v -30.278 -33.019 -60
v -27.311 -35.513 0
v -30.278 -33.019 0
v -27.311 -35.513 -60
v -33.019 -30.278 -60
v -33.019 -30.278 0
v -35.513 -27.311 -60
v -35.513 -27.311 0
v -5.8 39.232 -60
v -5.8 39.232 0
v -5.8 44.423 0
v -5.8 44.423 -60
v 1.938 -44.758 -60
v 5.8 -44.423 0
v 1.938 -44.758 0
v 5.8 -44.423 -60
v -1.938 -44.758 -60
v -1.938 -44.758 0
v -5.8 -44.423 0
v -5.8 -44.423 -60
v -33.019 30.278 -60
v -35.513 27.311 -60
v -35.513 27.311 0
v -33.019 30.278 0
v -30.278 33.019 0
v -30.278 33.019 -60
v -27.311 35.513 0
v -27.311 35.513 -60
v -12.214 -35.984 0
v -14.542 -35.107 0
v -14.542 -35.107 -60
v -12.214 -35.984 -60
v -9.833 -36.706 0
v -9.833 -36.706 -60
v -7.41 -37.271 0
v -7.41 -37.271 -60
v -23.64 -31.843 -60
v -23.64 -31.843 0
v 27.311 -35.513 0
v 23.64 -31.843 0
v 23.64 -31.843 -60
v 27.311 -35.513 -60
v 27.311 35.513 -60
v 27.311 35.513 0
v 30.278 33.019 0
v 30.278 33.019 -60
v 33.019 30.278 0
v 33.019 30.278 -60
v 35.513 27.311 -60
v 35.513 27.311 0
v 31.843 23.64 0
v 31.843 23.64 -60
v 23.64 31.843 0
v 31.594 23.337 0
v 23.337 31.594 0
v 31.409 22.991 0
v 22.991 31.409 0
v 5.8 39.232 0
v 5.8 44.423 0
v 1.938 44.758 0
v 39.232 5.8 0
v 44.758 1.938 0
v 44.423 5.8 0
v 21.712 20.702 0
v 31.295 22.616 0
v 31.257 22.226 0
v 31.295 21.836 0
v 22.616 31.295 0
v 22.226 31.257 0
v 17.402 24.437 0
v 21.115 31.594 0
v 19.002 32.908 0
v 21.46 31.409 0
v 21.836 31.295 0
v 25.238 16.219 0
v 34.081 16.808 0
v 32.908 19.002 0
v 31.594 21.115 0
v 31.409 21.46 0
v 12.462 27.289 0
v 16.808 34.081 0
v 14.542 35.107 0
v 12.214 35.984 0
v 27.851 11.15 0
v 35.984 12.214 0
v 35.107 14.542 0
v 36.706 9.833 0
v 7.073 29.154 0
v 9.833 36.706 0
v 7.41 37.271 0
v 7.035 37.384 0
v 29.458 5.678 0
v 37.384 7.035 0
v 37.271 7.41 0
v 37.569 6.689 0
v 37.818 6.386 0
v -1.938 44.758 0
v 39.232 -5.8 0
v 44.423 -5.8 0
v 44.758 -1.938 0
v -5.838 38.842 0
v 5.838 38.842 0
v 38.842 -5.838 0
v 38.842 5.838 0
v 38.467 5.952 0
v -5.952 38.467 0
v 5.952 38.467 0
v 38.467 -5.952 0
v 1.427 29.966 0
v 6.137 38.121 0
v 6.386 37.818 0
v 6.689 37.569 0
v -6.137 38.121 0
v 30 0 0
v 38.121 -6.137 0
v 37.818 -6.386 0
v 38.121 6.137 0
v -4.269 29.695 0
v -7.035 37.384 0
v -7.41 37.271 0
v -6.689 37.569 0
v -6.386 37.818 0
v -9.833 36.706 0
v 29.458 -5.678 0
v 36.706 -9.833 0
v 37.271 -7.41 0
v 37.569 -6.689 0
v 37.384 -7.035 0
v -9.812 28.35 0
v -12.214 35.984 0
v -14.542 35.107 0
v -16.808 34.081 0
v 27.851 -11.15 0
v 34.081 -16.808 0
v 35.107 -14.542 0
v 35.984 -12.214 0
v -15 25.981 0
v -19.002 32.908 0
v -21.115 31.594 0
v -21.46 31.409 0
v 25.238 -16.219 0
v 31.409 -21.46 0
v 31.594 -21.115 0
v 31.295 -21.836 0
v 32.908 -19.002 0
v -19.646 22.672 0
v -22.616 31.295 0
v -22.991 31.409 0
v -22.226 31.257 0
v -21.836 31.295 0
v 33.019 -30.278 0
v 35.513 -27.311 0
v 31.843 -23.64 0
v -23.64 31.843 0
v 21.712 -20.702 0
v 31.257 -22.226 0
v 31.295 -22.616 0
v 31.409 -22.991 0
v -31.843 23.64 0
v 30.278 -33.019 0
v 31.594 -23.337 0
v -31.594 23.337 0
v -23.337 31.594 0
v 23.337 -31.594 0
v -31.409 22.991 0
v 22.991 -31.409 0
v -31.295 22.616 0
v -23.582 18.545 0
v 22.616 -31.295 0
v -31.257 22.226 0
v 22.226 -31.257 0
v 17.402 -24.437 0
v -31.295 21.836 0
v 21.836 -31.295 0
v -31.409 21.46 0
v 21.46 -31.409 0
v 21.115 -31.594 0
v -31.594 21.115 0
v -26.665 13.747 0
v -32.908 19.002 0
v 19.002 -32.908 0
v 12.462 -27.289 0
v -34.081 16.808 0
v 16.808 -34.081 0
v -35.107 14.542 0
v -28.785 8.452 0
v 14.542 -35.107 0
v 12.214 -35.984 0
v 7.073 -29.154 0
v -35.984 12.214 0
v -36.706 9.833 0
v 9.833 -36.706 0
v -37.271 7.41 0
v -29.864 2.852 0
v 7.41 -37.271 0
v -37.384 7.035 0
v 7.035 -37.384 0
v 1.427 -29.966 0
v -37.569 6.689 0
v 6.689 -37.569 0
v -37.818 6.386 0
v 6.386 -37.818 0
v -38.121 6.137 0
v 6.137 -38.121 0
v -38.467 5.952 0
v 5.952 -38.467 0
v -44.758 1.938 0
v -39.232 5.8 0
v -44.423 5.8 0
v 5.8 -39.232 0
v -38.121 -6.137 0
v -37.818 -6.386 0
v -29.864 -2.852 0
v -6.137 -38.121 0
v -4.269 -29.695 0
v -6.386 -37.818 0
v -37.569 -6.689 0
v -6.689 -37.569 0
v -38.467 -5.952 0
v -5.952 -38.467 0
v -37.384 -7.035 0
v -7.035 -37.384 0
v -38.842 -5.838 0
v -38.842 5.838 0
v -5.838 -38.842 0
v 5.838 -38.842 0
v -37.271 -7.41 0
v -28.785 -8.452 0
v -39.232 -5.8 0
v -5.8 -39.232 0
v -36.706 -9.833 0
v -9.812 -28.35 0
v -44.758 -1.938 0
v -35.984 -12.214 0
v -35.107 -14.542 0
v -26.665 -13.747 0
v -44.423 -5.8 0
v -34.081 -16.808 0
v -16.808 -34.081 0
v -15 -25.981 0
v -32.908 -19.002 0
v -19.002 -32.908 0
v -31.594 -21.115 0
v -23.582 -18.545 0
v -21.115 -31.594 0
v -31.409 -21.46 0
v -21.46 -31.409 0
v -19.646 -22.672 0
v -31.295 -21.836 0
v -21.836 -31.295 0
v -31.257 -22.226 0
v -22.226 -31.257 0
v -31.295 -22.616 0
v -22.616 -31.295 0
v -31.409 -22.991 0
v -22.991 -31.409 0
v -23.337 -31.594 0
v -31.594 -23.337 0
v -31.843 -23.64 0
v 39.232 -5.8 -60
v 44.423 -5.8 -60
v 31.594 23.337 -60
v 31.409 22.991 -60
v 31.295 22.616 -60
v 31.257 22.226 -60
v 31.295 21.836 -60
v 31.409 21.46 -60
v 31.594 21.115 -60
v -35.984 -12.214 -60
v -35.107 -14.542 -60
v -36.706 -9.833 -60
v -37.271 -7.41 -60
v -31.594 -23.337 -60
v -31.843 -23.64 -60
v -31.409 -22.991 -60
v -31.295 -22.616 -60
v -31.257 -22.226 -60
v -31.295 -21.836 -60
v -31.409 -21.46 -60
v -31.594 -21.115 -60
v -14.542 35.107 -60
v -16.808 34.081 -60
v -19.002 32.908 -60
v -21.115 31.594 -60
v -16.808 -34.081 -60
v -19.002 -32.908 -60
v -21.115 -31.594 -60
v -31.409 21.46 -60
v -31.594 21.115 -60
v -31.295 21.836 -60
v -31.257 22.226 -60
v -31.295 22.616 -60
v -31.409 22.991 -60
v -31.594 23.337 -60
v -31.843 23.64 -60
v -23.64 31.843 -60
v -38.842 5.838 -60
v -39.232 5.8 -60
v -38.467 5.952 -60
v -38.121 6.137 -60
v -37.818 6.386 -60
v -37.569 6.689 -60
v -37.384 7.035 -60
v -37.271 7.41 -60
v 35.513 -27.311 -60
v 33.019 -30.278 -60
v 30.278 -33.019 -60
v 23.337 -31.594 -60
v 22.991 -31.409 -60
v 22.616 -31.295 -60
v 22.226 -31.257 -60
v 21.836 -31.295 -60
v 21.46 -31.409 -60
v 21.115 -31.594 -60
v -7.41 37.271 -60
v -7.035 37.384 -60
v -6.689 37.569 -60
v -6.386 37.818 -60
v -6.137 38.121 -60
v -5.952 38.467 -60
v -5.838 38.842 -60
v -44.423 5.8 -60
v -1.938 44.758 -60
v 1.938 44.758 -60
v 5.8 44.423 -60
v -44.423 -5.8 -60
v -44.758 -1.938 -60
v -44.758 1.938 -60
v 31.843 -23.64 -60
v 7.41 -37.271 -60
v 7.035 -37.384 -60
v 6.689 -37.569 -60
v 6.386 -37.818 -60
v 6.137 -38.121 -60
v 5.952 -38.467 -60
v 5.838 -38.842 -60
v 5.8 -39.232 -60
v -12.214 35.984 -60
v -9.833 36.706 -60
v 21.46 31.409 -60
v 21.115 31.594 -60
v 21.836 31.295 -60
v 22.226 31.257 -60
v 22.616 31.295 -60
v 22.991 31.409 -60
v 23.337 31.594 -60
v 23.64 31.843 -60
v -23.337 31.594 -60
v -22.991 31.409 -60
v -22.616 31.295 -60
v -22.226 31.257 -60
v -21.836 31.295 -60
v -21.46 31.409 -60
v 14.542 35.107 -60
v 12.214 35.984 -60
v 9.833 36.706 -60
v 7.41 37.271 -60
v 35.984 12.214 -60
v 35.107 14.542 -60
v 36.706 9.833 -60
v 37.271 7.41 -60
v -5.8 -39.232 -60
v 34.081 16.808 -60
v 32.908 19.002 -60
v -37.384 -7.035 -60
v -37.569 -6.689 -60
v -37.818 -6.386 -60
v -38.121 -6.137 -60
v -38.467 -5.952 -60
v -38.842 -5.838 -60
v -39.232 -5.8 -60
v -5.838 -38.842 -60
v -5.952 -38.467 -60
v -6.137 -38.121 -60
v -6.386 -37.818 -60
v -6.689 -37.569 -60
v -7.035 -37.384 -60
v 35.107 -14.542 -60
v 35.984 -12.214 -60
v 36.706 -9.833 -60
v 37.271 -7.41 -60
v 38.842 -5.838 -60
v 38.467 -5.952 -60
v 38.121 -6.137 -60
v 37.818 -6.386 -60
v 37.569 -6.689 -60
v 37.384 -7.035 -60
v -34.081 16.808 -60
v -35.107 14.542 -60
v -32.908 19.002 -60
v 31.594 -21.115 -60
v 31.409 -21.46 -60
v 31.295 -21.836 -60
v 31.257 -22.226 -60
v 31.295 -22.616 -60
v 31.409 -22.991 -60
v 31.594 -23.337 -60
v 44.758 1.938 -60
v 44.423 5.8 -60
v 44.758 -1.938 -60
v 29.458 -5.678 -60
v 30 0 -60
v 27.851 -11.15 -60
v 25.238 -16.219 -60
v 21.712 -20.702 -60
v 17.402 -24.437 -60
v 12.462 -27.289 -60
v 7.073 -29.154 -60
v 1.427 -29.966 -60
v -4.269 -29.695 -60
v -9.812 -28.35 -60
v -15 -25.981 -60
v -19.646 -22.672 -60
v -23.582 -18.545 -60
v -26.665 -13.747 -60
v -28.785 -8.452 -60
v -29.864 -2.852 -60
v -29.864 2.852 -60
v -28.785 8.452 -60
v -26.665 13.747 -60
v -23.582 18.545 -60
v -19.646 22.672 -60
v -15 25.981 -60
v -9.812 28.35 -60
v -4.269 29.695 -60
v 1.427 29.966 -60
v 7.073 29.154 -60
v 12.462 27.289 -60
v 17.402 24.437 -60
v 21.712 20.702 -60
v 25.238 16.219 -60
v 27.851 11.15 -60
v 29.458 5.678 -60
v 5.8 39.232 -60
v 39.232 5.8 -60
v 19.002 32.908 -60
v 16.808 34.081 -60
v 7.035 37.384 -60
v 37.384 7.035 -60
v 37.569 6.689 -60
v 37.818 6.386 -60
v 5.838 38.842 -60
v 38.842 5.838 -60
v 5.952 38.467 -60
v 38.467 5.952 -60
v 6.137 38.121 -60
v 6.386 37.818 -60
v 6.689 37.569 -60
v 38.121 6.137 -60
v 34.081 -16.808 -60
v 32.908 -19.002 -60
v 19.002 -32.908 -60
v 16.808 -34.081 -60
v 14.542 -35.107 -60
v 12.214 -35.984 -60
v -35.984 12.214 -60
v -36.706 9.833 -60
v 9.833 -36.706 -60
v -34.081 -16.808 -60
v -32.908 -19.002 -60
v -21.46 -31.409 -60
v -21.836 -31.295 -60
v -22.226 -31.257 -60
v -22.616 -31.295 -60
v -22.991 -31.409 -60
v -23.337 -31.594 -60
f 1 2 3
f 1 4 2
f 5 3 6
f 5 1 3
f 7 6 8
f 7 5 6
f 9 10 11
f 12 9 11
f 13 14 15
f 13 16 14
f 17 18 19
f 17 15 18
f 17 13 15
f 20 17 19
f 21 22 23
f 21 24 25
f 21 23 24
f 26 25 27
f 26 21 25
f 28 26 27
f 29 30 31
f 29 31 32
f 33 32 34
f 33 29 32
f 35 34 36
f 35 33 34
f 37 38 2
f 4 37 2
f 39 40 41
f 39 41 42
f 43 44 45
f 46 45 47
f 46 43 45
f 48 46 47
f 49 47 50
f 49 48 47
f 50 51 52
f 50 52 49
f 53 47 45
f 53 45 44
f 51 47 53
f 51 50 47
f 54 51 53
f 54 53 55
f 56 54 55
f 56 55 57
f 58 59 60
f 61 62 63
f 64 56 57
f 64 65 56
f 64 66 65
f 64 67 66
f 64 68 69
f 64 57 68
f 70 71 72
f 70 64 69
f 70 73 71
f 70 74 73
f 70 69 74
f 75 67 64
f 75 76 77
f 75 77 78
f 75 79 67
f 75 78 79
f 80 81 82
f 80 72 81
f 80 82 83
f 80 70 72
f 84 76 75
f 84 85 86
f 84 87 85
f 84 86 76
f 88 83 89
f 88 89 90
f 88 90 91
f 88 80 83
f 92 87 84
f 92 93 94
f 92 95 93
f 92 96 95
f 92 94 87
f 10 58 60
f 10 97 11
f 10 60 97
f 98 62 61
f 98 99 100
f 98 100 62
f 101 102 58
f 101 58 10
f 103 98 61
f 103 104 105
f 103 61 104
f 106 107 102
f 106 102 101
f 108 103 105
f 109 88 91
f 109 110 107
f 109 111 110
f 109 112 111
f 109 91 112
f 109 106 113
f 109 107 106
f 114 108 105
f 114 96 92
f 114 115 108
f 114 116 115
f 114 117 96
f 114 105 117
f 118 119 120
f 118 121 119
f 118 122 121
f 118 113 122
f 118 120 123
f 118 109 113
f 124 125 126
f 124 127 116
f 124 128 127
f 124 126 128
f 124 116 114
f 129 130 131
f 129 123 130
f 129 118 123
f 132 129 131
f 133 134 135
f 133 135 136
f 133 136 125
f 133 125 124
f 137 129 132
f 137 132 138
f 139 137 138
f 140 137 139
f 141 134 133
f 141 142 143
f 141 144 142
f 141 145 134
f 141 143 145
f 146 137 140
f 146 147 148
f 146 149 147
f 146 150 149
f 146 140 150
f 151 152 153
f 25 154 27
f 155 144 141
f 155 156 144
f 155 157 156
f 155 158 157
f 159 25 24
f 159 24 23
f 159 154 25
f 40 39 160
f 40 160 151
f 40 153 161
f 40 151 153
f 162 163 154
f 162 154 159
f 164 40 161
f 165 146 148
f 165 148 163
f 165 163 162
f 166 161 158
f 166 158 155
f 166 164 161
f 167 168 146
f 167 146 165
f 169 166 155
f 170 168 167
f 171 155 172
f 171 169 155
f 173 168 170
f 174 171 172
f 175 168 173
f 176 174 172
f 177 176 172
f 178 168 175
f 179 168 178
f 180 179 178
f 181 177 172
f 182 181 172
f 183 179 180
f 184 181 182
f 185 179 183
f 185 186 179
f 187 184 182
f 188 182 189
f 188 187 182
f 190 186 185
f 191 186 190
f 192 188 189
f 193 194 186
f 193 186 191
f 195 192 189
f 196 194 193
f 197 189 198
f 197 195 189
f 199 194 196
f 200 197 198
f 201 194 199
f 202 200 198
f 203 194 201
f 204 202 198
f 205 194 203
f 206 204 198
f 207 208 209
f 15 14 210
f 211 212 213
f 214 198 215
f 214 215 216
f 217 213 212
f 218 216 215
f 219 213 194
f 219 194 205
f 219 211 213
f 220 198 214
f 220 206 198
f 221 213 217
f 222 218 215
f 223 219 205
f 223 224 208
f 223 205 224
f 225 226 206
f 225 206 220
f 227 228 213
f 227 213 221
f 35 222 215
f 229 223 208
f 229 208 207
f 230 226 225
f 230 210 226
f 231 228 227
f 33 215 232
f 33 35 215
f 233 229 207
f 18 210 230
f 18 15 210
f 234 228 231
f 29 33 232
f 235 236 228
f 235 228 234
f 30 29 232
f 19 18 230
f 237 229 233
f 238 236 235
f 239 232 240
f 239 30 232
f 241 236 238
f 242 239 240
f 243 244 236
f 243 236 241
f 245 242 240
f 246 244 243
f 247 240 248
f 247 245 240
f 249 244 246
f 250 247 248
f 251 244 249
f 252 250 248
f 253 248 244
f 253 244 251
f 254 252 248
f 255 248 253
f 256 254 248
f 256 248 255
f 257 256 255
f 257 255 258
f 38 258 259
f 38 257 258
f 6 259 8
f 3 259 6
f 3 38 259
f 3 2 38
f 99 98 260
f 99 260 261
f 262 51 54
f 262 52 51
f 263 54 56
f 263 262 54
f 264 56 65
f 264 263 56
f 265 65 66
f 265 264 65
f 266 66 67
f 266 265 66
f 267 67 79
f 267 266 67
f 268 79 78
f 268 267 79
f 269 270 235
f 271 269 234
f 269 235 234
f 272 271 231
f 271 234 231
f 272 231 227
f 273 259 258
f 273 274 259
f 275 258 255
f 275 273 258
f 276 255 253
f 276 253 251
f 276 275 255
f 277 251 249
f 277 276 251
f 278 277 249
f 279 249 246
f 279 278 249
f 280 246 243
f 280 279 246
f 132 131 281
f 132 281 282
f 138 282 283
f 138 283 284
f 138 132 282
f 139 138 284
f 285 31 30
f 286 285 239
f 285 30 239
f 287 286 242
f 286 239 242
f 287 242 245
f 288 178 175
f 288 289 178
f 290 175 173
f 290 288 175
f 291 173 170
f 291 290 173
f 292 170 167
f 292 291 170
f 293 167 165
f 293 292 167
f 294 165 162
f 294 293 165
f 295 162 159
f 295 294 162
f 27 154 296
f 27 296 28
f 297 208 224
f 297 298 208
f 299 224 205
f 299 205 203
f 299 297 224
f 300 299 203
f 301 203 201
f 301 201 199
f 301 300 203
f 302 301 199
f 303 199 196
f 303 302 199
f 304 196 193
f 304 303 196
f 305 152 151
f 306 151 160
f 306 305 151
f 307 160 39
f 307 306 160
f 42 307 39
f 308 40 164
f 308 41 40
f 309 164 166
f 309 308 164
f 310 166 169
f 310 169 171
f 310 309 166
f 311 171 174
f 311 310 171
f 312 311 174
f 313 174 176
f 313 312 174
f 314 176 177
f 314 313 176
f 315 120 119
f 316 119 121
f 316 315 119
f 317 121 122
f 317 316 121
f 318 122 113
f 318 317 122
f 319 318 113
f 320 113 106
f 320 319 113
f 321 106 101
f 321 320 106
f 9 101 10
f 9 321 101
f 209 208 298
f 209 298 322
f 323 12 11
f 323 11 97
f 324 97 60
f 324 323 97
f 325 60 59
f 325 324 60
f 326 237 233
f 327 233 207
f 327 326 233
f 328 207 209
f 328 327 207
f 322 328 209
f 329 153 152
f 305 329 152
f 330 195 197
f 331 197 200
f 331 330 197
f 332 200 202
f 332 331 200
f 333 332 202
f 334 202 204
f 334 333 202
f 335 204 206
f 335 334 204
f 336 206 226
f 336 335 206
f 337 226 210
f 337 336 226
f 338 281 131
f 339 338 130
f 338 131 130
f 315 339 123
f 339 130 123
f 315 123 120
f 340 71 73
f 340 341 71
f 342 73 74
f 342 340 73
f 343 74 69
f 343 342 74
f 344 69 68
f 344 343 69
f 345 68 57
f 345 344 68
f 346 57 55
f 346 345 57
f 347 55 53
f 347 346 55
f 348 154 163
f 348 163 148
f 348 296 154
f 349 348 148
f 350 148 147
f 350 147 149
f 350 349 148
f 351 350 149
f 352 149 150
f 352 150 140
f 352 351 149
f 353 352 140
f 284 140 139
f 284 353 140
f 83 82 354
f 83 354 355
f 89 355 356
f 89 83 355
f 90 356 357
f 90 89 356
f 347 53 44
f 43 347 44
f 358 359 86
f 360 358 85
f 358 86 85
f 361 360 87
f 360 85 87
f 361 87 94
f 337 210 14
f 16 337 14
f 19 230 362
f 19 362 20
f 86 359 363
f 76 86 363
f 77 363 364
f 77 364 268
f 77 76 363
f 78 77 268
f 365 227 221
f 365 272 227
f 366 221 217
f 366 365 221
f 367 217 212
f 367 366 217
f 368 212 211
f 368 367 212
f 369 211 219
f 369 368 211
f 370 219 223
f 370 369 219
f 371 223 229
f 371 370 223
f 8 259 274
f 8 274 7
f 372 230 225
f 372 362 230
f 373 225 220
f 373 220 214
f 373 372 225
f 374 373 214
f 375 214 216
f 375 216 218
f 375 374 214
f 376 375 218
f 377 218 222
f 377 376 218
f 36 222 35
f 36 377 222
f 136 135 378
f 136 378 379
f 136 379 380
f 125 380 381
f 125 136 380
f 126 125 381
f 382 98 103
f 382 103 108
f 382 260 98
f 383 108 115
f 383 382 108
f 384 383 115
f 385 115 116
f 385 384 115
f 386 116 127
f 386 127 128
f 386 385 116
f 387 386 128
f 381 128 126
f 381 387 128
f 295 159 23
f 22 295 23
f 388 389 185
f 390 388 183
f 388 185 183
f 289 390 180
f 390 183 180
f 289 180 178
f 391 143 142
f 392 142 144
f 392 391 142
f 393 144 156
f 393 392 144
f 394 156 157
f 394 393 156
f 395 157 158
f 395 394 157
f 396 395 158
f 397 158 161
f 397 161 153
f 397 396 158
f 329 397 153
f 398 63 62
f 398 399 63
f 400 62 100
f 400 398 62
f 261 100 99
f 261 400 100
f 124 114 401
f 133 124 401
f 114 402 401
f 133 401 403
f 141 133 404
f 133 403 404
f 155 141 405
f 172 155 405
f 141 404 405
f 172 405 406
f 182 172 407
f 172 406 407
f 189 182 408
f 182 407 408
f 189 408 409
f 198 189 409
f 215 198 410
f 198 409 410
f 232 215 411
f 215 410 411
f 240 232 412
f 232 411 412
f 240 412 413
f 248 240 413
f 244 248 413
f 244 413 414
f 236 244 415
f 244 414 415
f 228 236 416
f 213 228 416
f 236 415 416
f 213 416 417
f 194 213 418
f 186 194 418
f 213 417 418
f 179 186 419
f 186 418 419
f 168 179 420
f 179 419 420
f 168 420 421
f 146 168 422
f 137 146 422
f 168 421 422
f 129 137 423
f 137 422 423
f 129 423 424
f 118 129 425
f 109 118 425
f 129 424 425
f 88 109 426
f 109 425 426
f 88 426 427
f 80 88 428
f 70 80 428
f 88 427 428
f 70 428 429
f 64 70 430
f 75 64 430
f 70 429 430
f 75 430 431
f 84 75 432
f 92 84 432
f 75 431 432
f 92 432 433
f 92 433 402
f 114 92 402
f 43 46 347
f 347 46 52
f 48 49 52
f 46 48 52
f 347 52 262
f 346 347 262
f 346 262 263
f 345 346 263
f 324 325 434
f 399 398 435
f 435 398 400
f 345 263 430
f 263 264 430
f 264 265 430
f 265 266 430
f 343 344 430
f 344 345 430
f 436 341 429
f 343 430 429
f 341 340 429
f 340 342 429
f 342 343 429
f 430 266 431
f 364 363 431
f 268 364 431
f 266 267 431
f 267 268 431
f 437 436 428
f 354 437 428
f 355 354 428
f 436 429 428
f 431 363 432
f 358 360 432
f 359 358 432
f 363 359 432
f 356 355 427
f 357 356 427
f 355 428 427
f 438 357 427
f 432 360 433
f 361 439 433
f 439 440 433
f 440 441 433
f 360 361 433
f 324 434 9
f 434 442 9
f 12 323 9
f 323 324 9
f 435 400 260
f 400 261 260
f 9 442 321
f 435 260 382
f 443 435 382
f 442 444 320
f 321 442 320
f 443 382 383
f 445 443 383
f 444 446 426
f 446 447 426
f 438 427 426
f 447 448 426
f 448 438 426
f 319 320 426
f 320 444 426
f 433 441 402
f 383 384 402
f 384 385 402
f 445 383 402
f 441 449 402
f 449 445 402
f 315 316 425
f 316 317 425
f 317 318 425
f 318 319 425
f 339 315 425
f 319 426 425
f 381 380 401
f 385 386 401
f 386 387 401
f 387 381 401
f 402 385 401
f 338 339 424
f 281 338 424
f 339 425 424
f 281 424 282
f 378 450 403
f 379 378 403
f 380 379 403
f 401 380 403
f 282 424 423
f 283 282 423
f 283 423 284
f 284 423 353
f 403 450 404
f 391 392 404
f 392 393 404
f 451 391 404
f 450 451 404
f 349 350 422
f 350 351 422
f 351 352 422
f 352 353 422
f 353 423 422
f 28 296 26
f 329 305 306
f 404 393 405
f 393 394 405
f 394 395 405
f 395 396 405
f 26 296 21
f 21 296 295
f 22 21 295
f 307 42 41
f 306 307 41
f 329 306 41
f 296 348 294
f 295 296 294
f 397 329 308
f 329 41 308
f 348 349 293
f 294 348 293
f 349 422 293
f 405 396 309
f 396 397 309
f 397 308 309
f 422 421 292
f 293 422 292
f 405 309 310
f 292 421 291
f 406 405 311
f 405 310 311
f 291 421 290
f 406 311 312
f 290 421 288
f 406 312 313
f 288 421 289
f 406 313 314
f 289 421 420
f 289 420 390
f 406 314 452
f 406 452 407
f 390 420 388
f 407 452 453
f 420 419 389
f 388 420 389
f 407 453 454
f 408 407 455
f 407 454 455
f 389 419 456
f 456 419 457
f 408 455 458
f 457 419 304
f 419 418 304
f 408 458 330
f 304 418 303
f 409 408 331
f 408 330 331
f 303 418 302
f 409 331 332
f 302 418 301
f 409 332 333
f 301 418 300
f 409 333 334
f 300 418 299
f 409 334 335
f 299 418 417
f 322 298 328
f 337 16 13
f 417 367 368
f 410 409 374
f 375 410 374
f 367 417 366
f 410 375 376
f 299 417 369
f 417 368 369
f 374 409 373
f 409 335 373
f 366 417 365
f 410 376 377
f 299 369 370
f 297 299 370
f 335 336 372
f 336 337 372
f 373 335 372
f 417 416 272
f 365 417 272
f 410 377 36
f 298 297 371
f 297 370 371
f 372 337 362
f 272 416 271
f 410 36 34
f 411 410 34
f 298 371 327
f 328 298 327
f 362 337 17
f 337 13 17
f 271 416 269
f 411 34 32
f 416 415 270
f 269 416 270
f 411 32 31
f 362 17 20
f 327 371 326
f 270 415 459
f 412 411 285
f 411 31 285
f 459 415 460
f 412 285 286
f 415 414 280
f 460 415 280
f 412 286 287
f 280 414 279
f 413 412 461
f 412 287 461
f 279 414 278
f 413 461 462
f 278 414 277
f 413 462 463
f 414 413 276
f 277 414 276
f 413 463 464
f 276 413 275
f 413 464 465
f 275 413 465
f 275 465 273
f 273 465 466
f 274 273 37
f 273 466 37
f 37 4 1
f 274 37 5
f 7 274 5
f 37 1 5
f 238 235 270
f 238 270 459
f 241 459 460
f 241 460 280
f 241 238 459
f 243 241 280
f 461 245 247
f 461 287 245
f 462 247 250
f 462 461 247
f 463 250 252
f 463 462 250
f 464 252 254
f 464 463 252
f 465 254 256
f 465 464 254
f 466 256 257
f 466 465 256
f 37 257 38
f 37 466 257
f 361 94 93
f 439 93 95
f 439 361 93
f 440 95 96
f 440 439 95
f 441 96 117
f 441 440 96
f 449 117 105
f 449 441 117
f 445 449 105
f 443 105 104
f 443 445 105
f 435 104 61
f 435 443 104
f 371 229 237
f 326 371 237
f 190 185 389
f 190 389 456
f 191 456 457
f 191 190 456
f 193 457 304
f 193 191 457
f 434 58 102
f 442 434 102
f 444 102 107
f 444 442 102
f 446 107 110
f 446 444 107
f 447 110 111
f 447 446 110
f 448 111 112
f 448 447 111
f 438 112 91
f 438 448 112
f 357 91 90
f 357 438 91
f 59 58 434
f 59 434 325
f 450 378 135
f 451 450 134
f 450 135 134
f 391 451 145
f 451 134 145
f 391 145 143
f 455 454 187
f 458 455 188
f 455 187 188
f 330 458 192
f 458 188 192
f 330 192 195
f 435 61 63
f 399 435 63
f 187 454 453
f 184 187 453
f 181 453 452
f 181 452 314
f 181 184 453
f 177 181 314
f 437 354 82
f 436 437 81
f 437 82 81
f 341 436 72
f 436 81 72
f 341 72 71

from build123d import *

# Parameters (mm, degrees)
SKETCH_2_W                       = 60
SKETCH_2_H                       = 14.8
CUT_EXTRUDE_1_DEPTH              = 88.258695842
FILLET_2_R                       = 2
PATTERN_CIRCULAR_1_COUNT         = 8
FILLET_2_OF_PATTERN_CIRCULAR_1_R = 2


with BuildPart() as part:
    # Эскиз2 → Повернуть1 (revolve)
    with BuildSketch(Plane(origin=(0, 0, 0), x_dir=(0, 0, -1), z_dir=(1, 0, 0)), mode=Mode.PRIVATE) as revolve_1_sk:
        with Locations((30, 37.4)):
            Rectangle(SKETCH_2_W, SKETCH_2_H)
    revolve(revolve_1_sk.sketch.rotate(Axis((0, 0, 0), (0, 0, -1)), 90), axis=Axis((0, 0, 0), (0, 0, -1)))

    # Эскиз4 → Вырез-Вытянуть1 (cut, through all)
    with BuildSketch(Plane.XY):
        with BuildLine():
            Line((-5.8, 37.554760018), (-5.8, 44.422967033))
            ThreePointArc((-5.8, 44.422967033), (-11.571918734, 43.279679953), (-17.14421777, 41.389803057))
            Line((-17.14421777, 41.389803057), (-14.54197043, 35.107422235))
            ThreePointArc((-14.54197043, 35.107422235), (-10.244330422, 36.5930826), (-5.8, 37.554760018))
        make_face()
        with BuildLine():
            Line((5.8, 37.554760018), (5.8, 44.422967033))
            ThreePointArc((5.8, 44.422967033), (11.571918734, 43.279679953), (17.14421777, 41.389803057))
            Line((17.14421777, 41.389803057), (14.54197043, 35.107422235))
            ThreePointArc((14.54197043, 35.107422235), (10.244330422, 36.5930826), (5.8, 37.554760018))
        make_face()
    cut_extrude_1 = extrude(amount=-CUT_EXTRUDE_1_DEPTH, mode=Mode.SUBTRACT)

    # Скругление2
    fillet_2_edges = [part.edges().sort_by_distance(p)[0] for p in [
        (-5.8, 37.554760018, -30),
        (5.8, 37.554760018, -30),
    ]]
    fillet(fillet_2_edges, radius=FILLET_2_R)

    # Круговой массив1: Вырез-Вытянуть1 ×8 about axis
    pattern_circular_1_axis = Axis((0, 0, 0), (0, 0, 1))
    for i in range(1, PATTERN_CIRCULAR_1_COUNT):
        add(cut_extrude_1.rotate(pattern_circular_1_axis, i * 360 / PATTERN_CIRCULAR_1_COUNT), mode=Mode.SUBTRACT)

    # Скругление2 of Круговой массив1
    fillet_2_of_pattern_circular_1_edges = [part.edges().sort_by_distance(p)[0] for p in [
        (-30.656444805, 22.454006144, -30),
        (-22.454006144, 30.656444805, -30),
        (-37.554760018, -5.8, -30),
        (-37.554760018, 5.8, -30),
        (-22.454006144, -30.656444805, -30),
        (-30.656444805, -22.454006144, -30),
        (5.8, -37.554760018, -30),
        (-5.8, -37.554760018, -30),
        (30.656444805, -22.454006144, -30),
        (22.454006144, -30.656444805, -30),
        (37.554760018, 5.8, -30),
        (37.554760018, -5.8, -30),
        (22.454006144, 30.656444805, -30),
        (30.656444805, 22.454006144, -30),
    ]]
    fillet(fillet_2_of_pattern_circular_1_edges, radius=FILLET_2_OF_PATTERN_CIRCULAR_1_R)


solid = part.part
